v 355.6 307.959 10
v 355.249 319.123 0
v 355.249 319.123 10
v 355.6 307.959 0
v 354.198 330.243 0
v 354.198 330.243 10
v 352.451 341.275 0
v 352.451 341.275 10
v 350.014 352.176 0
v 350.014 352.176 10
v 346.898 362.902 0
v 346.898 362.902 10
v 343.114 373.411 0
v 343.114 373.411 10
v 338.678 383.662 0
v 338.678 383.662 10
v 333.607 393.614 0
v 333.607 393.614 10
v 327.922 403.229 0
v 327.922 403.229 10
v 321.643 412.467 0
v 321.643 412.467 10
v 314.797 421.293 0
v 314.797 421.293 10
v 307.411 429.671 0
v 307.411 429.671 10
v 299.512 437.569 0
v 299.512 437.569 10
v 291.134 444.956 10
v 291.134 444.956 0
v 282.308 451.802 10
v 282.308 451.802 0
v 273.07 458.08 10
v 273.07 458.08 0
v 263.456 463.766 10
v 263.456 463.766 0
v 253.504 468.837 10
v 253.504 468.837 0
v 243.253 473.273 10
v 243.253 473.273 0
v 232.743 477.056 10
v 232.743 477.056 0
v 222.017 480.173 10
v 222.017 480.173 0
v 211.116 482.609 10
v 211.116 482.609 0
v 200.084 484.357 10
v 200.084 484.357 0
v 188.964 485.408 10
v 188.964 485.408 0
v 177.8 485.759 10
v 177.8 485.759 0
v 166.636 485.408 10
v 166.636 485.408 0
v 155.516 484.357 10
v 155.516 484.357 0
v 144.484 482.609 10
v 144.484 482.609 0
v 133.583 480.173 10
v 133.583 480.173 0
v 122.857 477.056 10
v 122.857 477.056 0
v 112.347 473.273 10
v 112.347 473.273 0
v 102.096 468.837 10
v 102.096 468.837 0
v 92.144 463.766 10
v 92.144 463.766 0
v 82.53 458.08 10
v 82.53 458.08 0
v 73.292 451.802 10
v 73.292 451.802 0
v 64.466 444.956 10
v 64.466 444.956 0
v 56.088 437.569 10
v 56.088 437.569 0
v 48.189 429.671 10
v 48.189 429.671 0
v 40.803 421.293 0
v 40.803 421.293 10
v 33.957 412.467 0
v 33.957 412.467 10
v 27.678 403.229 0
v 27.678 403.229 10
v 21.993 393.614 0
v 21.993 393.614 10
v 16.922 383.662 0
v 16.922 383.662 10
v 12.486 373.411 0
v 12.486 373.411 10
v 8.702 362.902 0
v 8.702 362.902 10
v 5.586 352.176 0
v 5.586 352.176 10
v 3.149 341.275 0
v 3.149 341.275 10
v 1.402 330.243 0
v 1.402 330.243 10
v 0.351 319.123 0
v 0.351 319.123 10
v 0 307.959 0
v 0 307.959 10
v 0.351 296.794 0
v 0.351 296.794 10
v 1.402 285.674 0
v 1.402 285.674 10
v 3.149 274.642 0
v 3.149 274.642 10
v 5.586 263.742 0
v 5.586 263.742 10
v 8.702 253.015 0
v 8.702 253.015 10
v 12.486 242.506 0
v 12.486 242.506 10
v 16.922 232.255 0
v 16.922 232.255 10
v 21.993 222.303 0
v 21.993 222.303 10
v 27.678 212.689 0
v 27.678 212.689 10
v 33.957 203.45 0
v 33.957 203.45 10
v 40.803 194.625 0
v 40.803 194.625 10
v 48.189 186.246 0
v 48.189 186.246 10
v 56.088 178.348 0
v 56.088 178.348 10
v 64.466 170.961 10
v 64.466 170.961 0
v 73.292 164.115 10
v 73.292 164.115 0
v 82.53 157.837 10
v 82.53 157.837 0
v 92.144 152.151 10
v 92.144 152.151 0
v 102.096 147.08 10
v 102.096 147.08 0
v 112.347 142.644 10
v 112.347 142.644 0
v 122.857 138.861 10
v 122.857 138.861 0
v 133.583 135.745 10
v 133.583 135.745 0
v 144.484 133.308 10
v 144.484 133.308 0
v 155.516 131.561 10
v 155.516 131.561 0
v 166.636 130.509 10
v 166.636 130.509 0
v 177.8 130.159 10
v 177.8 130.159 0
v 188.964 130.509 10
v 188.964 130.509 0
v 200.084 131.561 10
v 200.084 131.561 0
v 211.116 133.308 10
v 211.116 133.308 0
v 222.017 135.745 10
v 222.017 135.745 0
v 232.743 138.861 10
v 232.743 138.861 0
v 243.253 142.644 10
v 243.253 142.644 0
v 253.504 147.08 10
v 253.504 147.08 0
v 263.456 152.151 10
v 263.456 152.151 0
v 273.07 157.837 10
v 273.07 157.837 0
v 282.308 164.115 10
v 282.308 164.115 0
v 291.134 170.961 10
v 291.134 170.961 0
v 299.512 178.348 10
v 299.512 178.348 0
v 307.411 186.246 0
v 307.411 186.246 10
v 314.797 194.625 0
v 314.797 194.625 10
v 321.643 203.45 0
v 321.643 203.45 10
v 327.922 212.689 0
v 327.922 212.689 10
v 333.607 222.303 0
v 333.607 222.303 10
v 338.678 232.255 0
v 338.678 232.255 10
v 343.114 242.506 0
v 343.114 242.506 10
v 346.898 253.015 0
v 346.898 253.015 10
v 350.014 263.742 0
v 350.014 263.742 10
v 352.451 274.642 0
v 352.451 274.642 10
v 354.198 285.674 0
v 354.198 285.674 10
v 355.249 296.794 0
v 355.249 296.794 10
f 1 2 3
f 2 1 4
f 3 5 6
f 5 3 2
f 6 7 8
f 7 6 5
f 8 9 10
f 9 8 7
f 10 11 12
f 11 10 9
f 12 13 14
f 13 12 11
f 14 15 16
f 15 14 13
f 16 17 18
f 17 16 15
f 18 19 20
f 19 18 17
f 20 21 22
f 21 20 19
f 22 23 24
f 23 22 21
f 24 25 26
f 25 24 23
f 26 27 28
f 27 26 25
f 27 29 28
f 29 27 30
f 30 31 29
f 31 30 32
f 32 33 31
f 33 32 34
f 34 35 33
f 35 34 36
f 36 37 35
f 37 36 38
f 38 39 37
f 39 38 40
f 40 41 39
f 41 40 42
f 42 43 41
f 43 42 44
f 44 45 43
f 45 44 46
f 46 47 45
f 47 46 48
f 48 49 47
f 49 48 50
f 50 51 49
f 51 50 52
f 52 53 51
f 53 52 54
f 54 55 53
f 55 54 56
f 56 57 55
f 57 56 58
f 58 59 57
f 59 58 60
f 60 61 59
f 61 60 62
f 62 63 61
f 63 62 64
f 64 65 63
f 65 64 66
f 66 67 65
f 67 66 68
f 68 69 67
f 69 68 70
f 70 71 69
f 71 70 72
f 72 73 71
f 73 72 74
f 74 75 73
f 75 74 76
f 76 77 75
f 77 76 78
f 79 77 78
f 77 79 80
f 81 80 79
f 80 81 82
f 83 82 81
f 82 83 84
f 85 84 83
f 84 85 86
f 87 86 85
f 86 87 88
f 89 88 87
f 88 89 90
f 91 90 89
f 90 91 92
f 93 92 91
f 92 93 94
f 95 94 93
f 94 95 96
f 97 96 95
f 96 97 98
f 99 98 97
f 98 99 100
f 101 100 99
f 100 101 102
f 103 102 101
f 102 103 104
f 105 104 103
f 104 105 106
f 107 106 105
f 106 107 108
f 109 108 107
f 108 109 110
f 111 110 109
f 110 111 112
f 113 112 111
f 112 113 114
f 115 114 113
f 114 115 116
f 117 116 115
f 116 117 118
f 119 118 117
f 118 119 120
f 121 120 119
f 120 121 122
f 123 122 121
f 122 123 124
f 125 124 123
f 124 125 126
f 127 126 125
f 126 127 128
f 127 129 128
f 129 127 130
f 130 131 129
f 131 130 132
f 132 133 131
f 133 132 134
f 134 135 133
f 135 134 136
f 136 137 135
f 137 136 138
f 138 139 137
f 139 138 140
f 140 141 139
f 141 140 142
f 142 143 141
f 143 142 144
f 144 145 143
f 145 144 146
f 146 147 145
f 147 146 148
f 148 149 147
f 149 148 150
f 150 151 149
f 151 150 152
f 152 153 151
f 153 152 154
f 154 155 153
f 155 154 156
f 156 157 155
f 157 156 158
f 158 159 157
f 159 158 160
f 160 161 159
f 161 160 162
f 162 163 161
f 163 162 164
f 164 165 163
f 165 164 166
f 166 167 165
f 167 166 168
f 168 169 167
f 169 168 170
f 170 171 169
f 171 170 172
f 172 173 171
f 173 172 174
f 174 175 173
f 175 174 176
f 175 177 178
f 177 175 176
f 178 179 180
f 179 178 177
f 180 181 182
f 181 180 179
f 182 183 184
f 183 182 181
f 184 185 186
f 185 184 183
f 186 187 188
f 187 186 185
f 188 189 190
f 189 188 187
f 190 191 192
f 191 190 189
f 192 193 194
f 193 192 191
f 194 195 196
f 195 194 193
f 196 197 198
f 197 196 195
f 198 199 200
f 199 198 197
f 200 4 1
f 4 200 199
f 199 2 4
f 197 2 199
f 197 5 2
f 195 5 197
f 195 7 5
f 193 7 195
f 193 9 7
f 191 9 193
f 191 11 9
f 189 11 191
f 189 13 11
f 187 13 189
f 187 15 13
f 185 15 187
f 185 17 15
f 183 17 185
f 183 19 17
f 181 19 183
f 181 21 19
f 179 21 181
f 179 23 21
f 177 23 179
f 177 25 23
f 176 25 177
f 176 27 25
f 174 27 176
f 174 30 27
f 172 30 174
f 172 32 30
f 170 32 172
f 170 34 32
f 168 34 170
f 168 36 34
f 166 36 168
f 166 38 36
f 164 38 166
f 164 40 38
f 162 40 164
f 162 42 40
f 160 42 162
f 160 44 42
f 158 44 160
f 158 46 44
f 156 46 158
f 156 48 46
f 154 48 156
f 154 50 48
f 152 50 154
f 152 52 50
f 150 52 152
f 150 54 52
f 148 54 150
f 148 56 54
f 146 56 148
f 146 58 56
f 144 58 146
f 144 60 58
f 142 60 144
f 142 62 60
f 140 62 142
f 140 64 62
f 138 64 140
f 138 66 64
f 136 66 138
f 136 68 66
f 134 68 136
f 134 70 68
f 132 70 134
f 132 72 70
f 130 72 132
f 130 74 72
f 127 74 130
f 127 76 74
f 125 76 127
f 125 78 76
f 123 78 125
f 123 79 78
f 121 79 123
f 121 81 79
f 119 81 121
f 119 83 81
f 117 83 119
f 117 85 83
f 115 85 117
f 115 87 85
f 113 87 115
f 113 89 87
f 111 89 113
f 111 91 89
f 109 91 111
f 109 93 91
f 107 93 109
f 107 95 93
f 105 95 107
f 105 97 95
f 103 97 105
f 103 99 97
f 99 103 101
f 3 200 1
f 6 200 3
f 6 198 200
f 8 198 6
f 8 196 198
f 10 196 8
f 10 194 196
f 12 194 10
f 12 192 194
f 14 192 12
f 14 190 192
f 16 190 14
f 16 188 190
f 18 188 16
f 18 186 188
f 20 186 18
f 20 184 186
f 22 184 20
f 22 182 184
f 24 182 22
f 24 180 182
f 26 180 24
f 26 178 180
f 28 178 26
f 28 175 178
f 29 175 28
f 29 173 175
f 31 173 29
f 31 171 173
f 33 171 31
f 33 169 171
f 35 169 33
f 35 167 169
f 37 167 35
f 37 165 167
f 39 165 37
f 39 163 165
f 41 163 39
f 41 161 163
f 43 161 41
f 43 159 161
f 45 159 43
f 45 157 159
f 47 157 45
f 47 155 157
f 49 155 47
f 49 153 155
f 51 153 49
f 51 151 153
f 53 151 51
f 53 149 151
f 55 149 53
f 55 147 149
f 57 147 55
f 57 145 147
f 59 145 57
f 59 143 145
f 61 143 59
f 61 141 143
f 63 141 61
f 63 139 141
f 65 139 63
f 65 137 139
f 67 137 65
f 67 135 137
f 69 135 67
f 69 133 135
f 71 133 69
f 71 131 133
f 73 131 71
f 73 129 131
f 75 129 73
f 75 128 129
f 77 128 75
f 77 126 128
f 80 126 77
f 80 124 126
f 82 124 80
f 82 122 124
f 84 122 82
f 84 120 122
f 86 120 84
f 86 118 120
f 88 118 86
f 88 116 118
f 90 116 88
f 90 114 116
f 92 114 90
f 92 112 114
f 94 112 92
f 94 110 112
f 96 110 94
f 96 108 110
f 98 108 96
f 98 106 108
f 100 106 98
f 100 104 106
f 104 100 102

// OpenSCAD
$fn=100;

color("Green") translate([(304.8+25.4*2)/2,(304.8+25.4*2)*sqrt(3)/2,0]) cylinder(d=(304.8+25.4*2), h=10);
polygon(points=[[0,0],[(304.8+25.4*2)*sqrt(3)/2*sqrt(3),(304.8+25.4*2)*sqrt(3)/2],[0,(304.8+25.4*2)*sqrt(3)]]);
//2*304.8/sqrt(3)
echo((304.8+25.4*2)*sqrt(3));
